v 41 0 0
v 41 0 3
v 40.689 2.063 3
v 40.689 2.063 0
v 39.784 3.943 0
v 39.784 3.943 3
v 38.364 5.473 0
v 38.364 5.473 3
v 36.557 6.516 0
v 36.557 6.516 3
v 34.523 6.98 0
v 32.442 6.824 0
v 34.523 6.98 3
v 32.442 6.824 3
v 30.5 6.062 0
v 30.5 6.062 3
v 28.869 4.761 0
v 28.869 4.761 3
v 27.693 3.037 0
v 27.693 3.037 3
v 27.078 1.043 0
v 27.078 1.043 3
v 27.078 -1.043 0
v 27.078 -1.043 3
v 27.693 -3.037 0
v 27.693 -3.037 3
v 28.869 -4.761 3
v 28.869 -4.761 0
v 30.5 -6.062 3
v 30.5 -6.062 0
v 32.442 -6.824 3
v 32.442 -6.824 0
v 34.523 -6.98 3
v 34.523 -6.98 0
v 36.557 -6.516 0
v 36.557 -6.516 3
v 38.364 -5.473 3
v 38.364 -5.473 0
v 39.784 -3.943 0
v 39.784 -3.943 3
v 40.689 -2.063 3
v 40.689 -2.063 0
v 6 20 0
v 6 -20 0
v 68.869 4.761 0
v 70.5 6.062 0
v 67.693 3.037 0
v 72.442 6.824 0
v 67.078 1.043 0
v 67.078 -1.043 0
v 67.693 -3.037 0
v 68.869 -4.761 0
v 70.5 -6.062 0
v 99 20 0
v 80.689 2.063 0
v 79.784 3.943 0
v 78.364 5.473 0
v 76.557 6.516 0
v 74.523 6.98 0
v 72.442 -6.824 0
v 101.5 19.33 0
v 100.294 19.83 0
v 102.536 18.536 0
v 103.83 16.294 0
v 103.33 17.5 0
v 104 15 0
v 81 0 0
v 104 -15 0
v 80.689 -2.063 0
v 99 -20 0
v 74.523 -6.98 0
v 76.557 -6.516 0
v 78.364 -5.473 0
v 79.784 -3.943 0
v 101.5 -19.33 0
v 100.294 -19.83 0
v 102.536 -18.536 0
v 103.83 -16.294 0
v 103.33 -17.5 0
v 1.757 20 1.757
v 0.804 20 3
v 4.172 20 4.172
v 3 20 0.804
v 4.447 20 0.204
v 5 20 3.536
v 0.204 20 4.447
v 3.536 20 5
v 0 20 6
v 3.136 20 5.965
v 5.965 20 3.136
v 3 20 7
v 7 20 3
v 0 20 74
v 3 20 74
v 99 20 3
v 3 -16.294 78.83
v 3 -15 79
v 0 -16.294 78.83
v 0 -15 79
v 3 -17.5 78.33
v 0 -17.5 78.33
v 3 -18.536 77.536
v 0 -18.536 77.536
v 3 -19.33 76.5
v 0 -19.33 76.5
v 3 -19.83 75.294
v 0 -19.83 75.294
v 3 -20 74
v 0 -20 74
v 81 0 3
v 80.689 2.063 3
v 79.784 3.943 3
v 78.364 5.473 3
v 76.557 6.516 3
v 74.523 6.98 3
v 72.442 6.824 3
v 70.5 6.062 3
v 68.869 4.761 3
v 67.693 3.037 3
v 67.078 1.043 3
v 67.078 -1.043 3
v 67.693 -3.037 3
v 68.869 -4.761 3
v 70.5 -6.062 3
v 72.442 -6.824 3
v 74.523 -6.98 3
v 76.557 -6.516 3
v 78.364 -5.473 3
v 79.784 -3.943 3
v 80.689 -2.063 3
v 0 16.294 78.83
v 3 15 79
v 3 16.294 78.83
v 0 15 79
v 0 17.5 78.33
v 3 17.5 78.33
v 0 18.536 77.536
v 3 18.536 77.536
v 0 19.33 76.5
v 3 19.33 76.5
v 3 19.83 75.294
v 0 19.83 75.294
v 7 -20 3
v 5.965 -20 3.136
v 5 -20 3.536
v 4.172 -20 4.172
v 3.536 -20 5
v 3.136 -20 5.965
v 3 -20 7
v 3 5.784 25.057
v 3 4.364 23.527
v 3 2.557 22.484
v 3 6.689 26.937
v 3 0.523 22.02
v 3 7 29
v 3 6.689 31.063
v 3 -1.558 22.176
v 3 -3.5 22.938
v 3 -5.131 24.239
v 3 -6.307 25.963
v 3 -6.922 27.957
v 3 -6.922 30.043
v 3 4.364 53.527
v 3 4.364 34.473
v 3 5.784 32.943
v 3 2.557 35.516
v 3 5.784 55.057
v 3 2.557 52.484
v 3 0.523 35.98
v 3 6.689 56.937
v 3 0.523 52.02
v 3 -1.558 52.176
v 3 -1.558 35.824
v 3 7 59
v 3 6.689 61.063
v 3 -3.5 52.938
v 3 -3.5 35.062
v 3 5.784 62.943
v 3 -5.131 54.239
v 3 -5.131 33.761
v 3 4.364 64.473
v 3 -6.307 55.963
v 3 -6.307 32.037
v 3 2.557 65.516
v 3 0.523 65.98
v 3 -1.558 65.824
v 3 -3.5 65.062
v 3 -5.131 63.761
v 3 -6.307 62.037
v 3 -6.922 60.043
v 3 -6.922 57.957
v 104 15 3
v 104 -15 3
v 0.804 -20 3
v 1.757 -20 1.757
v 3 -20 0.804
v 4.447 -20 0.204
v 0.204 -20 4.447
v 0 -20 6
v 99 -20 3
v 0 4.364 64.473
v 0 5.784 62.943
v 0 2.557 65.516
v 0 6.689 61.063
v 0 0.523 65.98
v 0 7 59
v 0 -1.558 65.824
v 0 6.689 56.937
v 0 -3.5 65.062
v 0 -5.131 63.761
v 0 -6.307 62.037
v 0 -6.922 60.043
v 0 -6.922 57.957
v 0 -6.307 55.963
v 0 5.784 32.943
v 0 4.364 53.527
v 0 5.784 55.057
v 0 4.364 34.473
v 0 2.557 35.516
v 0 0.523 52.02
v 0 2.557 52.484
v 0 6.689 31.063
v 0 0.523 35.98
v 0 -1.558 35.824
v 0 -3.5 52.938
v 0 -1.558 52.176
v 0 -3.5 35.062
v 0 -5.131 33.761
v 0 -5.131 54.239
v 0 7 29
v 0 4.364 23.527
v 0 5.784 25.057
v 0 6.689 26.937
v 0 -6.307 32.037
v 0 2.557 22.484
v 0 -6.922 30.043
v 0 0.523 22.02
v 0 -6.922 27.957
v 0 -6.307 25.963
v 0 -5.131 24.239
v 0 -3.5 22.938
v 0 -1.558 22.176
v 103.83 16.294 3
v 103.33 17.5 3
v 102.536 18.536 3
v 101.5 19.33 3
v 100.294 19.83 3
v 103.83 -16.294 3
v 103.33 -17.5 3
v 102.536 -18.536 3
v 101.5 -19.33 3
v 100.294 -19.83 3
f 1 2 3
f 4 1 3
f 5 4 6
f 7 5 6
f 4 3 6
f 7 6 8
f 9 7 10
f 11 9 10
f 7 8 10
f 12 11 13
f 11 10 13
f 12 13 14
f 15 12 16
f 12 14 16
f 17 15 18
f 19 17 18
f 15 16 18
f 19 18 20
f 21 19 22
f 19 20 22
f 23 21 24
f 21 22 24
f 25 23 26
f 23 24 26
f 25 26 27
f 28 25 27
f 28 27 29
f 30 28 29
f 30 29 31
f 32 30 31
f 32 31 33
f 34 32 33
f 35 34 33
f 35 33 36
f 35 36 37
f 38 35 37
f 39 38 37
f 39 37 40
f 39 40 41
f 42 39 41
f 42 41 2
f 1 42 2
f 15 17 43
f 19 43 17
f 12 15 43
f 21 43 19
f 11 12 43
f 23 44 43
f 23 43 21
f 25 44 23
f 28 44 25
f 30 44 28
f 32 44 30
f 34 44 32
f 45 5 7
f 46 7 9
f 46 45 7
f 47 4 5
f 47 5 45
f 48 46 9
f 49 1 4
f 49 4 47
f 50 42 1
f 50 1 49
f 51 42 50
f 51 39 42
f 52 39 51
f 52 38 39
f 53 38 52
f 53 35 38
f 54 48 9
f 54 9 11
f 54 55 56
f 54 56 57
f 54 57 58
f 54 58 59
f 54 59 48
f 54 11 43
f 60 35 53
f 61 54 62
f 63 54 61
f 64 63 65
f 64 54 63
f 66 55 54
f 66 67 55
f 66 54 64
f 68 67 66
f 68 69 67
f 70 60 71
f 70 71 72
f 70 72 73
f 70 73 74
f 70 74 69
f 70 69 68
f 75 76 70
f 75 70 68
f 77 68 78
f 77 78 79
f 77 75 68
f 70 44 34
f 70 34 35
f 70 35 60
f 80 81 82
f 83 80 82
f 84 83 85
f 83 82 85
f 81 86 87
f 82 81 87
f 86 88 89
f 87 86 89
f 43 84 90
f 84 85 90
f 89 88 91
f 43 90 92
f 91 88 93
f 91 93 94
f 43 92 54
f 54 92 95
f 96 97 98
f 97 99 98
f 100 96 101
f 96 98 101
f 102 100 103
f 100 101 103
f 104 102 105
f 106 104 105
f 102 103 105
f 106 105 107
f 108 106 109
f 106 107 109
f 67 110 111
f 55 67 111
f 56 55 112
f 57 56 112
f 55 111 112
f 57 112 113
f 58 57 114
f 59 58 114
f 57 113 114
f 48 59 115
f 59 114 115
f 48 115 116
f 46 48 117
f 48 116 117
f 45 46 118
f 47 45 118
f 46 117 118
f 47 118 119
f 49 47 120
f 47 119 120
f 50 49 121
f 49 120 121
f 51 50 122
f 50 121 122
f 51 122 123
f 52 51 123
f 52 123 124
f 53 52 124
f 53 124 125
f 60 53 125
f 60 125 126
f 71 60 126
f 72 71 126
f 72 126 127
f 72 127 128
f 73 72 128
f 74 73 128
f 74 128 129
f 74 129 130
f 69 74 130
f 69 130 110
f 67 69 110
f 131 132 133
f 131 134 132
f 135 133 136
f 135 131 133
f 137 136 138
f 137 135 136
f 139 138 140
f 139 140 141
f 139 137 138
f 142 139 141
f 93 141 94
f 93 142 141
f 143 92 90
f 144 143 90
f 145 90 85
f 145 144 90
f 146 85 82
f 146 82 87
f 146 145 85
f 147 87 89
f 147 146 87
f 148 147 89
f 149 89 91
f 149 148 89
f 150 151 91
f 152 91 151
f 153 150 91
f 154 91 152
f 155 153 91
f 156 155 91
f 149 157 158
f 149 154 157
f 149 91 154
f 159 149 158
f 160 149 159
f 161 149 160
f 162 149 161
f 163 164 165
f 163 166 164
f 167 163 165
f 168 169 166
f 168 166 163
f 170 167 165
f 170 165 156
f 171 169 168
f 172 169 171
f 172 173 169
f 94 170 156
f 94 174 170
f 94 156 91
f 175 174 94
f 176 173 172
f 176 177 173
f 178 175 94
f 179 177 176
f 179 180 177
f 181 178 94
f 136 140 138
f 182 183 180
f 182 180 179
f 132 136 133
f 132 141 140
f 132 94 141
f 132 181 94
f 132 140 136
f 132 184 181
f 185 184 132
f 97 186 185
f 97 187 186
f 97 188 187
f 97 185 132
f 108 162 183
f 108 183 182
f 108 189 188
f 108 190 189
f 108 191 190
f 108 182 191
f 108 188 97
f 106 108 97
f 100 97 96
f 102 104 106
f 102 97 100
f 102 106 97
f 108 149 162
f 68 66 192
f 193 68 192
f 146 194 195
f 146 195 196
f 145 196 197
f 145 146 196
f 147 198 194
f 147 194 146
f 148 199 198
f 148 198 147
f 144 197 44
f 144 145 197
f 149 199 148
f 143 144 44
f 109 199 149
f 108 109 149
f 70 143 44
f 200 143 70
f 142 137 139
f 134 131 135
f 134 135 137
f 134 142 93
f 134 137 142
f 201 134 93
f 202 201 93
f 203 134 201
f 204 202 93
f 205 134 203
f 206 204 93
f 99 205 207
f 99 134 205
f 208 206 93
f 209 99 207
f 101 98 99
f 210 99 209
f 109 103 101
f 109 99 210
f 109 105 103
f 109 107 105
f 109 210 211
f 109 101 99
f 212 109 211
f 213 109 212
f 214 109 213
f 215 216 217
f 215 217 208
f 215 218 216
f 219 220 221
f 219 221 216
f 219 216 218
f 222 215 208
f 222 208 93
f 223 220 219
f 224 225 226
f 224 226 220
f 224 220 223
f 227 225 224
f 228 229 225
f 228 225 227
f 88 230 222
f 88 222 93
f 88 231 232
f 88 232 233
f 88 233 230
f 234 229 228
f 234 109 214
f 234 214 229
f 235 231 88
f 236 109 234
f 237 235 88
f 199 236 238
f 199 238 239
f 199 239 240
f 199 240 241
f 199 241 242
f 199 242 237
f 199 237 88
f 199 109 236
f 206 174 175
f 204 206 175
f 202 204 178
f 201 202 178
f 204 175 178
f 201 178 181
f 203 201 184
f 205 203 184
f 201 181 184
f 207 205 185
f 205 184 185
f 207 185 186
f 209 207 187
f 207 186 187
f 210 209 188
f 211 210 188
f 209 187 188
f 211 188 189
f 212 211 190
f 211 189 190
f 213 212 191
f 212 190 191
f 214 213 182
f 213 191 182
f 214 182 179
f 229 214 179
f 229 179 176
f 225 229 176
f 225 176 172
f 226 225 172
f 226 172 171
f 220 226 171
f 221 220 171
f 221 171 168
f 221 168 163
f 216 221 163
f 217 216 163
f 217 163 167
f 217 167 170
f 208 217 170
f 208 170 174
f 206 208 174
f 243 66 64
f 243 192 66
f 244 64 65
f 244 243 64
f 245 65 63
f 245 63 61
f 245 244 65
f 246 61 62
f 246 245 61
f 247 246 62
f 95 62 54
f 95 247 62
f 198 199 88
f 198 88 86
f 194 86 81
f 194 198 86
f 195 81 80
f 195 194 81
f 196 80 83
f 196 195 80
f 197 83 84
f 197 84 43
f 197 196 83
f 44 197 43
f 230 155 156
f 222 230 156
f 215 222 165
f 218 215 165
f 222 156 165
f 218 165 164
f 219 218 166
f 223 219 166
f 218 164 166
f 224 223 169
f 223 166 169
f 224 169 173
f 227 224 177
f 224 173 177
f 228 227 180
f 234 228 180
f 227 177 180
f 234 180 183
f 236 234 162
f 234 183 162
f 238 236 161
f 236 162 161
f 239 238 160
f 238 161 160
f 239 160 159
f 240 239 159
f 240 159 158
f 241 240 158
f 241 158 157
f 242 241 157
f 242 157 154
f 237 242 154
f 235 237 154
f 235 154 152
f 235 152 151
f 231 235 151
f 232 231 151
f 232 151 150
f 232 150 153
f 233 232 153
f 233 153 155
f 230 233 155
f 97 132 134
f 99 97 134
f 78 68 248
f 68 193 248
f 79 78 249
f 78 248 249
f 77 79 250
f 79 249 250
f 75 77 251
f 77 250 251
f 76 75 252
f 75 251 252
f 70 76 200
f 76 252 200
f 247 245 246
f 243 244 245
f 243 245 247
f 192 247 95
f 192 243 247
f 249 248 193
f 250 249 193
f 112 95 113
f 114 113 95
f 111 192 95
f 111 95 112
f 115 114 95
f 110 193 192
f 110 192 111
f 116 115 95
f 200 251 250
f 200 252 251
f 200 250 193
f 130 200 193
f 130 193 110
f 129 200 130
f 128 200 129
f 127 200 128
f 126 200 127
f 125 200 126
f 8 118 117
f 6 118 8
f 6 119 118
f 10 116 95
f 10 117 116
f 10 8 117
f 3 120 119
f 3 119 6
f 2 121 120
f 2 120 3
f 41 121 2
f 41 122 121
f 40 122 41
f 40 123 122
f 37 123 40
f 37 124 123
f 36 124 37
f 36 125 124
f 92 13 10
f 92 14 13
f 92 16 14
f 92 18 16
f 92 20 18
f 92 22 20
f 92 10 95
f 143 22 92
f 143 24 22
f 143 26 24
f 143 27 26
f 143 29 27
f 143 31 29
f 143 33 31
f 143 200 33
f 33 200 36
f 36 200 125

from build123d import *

# Parameters (mm, degrees)
F1_DEPTH = 20
F2_R     = 5
F3_R     = 7
F4_DEPTH = 25
F5_R     = 7
F6_DEPTH = 25


with BuildPart() as f1:
    # F0 (on Front) → F1 (new body, symmetric)
    with BuildSketch(Plane.XZ):
        with BuildLine():
            Line((0, 79), (0, 6))
            ThreePointArc((0, 6), (1.757359, 1.757359), (6, 0))
            Line((6, 0), (104, 0))
            Line((104, 0), (104, 3))
            Line((104, 3), (7, 3))
            ThreePointArc((7, 3), (4.171573, 4.171573), (3, 7))
            Line((3, 7), (3, 79))
            Line((3, 79), (0, 79))
        make_face()
    extrude(amount=F1_DEPTH, both=True)

    # F2
    f2_edges = [f1.edges().sort_by_distance(p)[0] for p in [
        (1.5, -20, 79),
        (1.5, 20, 79),
        (104, 20, 1.5),
        (104, -20, 1.5),
    ]]
    fillet(f2_edges, radius=F2_R)

    # F3 (on face) → F4 (cut)
    with BuildSketch(Plane.XY.offset(3)):
        with Locations((34, 0)):
            Circle(F3_R)
        with Locations((74, 0)):
            Circle(F3_R)
    extrude(amount=-F4_DEPTH, mode=Mode.SUBTRACT)

    # F5 (on face) → F6 (cut)
    with BuildSketch(Plane.YZ.offset(3)):
        with Locations((0, 59)):
            Circle(F5_R)
        with Locations((0, 29)):
            Circle(F5_R)
    extrude(amount=-F6_DEPTH, mode=Mode.SUBTRACT)


solid = f1.part
